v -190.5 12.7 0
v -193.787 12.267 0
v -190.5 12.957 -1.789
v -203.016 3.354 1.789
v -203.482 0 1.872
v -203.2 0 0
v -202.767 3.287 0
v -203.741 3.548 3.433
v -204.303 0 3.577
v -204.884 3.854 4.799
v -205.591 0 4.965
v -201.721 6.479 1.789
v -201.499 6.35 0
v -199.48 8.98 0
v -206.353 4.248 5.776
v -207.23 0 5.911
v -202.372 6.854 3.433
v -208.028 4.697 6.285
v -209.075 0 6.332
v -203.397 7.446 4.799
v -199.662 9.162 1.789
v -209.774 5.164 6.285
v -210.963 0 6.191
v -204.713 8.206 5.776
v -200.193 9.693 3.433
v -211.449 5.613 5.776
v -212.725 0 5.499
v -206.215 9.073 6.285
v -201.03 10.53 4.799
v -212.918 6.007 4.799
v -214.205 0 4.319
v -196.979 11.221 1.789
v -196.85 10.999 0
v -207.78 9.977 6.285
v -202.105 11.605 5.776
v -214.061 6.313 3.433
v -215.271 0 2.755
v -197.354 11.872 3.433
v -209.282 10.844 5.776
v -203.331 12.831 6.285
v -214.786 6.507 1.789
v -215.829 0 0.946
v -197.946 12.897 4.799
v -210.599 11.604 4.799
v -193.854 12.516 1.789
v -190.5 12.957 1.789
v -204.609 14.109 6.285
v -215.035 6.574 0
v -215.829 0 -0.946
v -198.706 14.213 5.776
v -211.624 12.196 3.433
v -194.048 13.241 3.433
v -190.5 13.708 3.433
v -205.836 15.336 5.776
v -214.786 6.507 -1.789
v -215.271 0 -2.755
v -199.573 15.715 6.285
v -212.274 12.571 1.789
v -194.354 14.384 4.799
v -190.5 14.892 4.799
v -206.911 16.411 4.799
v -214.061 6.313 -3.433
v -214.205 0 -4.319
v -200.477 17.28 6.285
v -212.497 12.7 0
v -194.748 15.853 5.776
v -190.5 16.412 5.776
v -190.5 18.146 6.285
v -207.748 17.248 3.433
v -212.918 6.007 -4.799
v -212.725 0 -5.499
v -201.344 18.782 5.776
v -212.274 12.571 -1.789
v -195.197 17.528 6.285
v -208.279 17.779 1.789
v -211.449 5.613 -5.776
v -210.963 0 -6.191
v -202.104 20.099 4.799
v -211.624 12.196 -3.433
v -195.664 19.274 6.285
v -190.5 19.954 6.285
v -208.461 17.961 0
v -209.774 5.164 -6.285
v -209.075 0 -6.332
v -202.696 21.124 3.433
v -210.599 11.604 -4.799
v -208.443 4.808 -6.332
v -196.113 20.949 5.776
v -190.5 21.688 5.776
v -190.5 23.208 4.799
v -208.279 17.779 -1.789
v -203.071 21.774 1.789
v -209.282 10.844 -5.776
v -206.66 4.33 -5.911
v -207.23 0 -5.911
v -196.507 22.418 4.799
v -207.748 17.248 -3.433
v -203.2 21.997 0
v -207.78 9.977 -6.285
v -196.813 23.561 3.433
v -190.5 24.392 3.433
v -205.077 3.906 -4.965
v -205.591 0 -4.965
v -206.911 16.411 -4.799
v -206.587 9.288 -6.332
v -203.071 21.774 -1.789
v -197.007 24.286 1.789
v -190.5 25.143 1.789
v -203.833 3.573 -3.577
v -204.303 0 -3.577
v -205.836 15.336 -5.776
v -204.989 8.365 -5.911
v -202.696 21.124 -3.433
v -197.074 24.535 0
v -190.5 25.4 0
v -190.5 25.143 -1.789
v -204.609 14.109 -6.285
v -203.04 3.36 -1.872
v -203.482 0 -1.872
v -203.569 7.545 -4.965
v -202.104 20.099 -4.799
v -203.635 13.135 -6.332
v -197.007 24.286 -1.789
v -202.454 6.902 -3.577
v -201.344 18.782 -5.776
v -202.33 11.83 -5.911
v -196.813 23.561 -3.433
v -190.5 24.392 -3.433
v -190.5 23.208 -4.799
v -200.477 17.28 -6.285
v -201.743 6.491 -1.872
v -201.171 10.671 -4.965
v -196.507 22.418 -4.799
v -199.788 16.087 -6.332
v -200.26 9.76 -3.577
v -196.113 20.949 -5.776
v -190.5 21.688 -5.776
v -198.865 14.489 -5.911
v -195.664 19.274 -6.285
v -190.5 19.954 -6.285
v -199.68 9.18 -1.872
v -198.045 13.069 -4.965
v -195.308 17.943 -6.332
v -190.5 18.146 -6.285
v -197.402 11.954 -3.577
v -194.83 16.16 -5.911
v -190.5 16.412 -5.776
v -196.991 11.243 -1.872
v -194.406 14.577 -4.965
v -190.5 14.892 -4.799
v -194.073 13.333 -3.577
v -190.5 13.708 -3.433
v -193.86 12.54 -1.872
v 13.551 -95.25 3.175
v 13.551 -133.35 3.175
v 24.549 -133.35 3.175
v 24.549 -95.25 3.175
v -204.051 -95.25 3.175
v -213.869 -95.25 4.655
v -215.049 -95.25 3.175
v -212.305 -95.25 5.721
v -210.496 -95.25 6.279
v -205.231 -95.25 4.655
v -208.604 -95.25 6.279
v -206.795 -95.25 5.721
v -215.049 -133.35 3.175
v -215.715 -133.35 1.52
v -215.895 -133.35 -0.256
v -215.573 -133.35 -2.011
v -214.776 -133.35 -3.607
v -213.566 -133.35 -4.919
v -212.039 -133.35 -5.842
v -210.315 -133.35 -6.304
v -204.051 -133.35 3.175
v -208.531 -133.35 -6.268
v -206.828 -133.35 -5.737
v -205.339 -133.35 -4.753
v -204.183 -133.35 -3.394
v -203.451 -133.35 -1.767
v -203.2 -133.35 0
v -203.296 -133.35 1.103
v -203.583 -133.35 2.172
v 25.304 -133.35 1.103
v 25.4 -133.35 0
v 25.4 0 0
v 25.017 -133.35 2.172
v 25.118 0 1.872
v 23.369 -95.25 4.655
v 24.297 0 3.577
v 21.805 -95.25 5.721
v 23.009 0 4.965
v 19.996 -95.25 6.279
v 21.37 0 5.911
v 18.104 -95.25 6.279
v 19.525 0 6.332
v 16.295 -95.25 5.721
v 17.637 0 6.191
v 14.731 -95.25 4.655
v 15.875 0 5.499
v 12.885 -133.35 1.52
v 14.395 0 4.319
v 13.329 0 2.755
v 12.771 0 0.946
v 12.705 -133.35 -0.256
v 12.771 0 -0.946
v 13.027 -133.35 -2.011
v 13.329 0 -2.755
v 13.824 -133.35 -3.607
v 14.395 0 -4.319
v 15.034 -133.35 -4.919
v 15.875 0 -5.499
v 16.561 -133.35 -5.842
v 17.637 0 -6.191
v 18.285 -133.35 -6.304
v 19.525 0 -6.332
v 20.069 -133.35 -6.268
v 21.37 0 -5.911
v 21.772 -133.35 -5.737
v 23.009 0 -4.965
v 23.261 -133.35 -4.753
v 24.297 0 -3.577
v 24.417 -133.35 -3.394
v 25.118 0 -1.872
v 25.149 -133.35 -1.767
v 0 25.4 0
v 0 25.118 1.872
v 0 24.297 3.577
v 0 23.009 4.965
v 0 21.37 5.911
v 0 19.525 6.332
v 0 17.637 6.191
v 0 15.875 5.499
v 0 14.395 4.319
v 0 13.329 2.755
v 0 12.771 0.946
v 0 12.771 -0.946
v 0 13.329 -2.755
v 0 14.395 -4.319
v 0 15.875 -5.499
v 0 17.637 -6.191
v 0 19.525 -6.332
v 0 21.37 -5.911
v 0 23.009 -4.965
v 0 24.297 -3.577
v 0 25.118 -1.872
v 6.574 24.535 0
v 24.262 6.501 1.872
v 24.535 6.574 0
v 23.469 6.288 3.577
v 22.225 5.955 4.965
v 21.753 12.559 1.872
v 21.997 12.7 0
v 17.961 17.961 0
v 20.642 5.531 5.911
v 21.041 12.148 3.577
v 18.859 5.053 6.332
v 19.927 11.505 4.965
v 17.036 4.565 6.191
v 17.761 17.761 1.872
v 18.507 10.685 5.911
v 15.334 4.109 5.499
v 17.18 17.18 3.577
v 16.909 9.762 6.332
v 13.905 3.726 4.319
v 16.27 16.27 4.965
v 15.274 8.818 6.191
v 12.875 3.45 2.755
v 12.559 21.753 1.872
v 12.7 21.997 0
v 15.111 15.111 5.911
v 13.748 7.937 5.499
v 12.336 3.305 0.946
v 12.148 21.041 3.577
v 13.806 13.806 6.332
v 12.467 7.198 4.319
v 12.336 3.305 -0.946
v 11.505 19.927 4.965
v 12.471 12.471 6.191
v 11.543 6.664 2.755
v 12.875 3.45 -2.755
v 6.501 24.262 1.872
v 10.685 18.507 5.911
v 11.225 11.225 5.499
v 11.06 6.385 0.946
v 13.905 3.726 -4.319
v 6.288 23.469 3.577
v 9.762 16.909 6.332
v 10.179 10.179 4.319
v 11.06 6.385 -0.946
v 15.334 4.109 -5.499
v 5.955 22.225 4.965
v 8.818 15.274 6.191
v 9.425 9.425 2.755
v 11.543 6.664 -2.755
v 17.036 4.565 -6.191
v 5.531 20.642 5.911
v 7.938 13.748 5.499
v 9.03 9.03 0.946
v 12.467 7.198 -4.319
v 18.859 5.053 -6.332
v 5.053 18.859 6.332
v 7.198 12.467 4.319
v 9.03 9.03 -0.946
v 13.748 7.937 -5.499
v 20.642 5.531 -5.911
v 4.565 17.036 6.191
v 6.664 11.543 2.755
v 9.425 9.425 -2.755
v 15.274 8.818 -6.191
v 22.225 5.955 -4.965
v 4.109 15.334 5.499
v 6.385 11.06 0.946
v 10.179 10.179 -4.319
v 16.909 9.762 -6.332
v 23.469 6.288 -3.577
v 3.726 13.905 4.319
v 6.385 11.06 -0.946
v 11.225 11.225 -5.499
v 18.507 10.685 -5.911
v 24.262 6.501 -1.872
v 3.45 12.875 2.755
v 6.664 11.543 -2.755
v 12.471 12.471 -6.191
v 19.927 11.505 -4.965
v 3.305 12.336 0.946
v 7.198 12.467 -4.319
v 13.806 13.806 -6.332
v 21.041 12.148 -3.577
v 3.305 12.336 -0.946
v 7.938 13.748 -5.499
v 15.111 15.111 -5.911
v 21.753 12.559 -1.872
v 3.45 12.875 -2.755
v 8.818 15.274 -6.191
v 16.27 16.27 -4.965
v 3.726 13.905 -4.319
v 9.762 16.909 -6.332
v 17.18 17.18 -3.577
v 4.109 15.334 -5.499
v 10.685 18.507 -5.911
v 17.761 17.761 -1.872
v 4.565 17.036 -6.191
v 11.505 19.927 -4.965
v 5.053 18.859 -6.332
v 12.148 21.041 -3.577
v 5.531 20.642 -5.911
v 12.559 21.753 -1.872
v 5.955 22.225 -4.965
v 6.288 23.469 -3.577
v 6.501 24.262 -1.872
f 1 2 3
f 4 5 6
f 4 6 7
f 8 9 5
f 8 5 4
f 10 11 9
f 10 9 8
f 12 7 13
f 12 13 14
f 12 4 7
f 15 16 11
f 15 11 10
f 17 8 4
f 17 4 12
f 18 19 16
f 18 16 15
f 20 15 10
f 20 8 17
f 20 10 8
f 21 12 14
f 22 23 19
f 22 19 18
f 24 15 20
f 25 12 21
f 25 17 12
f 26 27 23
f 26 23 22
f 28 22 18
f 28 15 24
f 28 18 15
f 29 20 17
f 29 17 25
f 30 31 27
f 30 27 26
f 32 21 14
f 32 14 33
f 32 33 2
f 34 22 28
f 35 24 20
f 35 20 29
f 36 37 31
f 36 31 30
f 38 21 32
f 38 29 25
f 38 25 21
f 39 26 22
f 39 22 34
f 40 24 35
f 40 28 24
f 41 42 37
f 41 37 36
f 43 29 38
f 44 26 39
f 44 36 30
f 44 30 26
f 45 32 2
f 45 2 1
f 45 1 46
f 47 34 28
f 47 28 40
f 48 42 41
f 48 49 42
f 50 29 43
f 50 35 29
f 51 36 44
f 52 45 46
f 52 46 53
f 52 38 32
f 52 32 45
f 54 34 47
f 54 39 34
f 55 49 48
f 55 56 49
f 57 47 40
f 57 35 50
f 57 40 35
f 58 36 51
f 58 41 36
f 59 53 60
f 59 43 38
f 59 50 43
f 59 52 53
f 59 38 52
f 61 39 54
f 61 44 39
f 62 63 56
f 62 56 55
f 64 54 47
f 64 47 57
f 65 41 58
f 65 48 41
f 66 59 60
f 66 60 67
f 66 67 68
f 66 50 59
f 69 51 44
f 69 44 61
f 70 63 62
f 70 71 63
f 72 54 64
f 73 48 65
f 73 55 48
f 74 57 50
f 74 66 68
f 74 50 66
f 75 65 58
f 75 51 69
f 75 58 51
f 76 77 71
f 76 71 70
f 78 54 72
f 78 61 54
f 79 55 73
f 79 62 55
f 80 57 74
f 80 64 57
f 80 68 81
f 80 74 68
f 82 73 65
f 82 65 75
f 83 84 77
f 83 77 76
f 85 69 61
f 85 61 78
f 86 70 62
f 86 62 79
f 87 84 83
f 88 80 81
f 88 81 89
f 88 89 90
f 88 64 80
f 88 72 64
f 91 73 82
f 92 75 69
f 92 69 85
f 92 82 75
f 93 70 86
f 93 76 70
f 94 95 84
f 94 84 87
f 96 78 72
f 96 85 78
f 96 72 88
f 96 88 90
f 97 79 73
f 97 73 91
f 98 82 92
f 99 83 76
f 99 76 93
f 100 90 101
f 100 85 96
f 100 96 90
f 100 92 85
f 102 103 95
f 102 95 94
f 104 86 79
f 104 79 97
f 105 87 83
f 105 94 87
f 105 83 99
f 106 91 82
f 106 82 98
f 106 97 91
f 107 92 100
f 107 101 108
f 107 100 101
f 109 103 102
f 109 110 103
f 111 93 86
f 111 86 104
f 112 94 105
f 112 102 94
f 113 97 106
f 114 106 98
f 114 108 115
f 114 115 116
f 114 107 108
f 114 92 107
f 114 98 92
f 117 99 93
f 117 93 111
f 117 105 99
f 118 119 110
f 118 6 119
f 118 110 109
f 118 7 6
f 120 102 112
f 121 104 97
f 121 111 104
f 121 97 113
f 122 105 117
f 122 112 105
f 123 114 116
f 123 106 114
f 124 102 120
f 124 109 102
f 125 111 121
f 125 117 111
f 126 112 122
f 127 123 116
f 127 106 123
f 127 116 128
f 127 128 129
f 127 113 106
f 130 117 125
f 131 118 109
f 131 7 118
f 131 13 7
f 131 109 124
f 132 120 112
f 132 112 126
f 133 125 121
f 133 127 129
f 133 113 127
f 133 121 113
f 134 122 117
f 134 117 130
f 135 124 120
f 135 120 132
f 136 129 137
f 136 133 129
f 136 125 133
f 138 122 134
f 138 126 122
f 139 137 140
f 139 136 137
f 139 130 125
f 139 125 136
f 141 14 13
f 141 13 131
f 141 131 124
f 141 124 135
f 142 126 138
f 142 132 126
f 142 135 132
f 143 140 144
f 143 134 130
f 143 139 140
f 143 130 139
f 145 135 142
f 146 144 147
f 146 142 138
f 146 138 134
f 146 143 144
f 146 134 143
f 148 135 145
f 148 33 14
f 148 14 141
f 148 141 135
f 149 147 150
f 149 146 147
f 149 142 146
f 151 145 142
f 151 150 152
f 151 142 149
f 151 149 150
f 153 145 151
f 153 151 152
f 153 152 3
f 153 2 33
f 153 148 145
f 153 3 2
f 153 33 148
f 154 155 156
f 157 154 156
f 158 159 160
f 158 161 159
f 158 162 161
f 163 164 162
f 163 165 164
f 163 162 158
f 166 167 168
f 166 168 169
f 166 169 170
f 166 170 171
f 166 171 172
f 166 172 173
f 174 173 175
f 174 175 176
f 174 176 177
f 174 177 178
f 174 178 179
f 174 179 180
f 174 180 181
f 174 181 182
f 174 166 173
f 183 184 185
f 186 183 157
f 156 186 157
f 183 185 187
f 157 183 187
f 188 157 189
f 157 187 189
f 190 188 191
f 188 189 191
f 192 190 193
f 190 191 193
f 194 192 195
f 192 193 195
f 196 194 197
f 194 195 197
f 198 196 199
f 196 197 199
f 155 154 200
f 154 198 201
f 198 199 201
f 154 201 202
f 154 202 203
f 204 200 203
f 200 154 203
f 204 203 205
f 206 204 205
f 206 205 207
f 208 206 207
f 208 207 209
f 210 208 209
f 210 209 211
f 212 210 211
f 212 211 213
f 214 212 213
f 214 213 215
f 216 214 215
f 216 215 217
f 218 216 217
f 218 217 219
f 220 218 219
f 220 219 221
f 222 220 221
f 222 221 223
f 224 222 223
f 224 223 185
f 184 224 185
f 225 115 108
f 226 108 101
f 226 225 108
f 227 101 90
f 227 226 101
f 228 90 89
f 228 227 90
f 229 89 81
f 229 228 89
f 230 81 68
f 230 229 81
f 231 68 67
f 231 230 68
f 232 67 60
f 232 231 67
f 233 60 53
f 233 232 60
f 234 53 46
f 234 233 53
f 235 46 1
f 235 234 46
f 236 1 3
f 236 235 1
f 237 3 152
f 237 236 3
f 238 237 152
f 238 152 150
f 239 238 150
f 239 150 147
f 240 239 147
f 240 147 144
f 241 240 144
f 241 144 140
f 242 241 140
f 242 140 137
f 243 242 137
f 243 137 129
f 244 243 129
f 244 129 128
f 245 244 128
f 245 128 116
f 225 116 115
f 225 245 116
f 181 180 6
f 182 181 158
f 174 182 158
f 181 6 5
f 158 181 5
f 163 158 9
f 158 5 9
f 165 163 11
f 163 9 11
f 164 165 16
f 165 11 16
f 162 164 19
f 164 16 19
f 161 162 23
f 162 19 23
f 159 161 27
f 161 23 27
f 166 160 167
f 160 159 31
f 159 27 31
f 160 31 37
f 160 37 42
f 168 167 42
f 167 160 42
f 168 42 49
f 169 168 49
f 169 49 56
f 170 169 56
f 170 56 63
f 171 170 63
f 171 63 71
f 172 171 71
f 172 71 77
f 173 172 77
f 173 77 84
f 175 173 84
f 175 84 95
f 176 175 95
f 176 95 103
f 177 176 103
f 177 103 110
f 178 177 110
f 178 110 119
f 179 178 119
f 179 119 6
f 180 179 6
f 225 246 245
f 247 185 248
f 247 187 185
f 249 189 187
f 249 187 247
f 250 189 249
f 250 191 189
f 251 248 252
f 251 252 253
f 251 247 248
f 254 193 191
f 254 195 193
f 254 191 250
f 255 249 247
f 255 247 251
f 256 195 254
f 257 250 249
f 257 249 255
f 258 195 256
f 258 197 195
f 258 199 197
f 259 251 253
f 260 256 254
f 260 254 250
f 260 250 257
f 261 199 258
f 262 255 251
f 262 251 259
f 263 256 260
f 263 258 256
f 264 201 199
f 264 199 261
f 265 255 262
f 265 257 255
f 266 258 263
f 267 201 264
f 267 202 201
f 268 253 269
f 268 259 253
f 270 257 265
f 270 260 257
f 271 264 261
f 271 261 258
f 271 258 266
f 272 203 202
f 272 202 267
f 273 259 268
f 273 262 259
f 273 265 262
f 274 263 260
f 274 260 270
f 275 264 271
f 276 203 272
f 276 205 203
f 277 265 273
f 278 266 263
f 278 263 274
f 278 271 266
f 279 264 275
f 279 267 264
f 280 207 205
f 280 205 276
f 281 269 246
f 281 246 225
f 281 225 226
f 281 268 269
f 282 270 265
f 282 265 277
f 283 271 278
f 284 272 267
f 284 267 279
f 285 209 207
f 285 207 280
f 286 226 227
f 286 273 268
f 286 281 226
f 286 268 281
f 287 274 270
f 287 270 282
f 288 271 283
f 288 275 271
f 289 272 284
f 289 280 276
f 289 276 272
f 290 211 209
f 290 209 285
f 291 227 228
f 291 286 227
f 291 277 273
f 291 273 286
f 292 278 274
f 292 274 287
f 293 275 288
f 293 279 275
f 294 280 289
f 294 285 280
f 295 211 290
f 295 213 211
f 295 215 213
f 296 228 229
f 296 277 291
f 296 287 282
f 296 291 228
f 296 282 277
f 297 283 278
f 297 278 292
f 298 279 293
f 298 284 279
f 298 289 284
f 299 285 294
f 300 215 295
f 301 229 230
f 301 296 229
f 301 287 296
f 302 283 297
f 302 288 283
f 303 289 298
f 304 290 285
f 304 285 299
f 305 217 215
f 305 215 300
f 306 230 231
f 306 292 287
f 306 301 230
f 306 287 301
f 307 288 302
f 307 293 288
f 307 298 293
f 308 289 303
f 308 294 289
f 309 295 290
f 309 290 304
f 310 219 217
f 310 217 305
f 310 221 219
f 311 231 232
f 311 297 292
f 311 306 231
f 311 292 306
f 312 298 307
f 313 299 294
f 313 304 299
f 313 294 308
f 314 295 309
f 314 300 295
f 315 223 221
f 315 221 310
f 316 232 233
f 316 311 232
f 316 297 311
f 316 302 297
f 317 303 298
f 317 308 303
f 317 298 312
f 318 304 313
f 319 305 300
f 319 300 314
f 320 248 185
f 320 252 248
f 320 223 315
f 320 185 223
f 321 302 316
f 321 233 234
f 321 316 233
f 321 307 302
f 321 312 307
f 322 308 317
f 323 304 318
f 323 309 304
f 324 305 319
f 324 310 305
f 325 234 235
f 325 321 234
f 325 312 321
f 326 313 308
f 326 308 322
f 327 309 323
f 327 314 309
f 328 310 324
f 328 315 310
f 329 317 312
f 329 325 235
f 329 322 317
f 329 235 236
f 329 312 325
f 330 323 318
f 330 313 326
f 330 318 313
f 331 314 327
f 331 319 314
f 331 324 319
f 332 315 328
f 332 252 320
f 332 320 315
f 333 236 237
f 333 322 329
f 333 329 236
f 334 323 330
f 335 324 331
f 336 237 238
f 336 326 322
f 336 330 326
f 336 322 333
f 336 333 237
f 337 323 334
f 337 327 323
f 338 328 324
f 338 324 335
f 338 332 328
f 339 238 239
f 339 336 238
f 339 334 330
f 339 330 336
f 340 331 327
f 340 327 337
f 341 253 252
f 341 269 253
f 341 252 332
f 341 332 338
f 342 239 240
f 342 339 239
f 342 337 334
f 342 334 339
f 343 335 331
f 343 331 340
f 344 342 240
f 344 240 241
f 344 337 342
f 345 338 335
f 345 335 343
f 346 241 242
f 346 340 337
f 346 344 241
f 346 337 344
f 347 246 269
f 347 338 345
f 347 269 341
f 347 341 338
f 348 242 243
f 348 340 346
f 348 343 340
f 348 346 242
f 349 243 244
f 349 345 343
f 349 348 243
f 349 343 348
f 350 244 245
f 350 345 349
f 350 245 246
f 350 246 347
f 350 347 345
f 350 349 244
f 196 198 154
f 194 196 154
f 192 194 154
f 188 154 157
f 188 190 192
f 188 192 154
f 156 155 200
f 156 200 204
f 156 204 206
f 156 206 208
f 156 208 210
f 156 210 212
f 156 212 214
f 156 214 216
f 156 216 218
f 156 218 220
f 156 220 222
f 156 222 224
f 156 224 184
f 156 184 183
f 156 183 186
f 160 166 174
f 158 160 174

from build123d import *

# Parameters (mm, degrees)
F0_R      = 6.35
F1_ANGLE  = 90
F2_R      = 6.35
F3_ANGLE  = 90
F4_DEPTH  = 190.5
F5_DEPTH  = 133.35
F6_DEPTH  = 133.35
F8_DEPTH  = 38.1
F11_W     = 26.8649879572
F11_H     = 14.6399100293
F12_DEPTH = 41.275


with BuildPart() as f1:
    # F0 (on Front) → F1 (revolve)
    with BuildSketch(Plane.XZ):
        with Locations((19.05, 0)):
            Circle(F0_R)
    revolve(axis=Axis((0, 0, 21.6534970575), (0, 0, 1)), revolution_arc=F1_ANGLE)

    # F4 (add, through all): a face of the model
    f4_faces = [f1.faces().sort_by_distance(p)[0] for p in [
        (0, 19.05, 0),
    ]]


with BuildPart() as f3:
    # F2 (on Front) → F3 (revolve)
    with BuildSketch(Plane.XZ):
        with Locations((-209.55, 0)):
            Circle(F2_R)
    revolve(axis=Axis((-190.5, 0, 30.7127628475), (0, 0, -1)), revolution_arc=F3_ANGLE)


with BuildPart() as f1_1:
    add(f1.part)

    add(f3.part)  # F4 merges F3
    extrude(f4_faces, amount=F4_DEPTH)

    # F5 (add): a face of the model
    f5_faces = [f1_1.faces().sort_by_distance(p)[0] for p in [
        (19.05, 0, 0),
    ]]
    extrude(f5_faces, amount=F5_DEPTH)

    # F6 (add): a face of the model
    f6_faces = [f1_1.faces().sort_by_distance(p)[0] for p in [
        (-209.55, 0, 0),
    ]]
    extrude(f6_faces, amount=F6_DEPTH)

    # F7 (on face) → F8 (cut)
    with BuildSketch(Plane.XZ.offset(133.35)):
        with BuildLine():
            Line((33.0460654503, 34.1169642213), (-229.9606265432, 34.1169642213))
            Line((-229.9606265432, 34.1169642213), (-229.9606265432, 3.175))
            Line((-229.9606265432, 3.175), (-215.049261314, 3.175))
            ThreePointArc((-215.049261314, 3.175), (-209.55, 6.35), (-204.050738686, 3.175))
            Line((-204.050738686, 3.175), (33.0460654503, 3.175))
            Line((33.0460654503, 3.175), (33.0460654503, 34.1169642213))
        make_face()
    extrude(amount=-F8_DEPTH, mode=Mode.SUBTRACT)

    # F11 (on offset) → F12 (cut)
    with BuildSketch(Plane.XZ.offset(136.525)):
        with Locations((-210.3848606348, 10.4949550146)):
            Rectangle(F11_W, F11_H)
    extrude(amount=-F12_DEPTH, mode=Mode.SUBTRACT)


solid = f1_1.part
